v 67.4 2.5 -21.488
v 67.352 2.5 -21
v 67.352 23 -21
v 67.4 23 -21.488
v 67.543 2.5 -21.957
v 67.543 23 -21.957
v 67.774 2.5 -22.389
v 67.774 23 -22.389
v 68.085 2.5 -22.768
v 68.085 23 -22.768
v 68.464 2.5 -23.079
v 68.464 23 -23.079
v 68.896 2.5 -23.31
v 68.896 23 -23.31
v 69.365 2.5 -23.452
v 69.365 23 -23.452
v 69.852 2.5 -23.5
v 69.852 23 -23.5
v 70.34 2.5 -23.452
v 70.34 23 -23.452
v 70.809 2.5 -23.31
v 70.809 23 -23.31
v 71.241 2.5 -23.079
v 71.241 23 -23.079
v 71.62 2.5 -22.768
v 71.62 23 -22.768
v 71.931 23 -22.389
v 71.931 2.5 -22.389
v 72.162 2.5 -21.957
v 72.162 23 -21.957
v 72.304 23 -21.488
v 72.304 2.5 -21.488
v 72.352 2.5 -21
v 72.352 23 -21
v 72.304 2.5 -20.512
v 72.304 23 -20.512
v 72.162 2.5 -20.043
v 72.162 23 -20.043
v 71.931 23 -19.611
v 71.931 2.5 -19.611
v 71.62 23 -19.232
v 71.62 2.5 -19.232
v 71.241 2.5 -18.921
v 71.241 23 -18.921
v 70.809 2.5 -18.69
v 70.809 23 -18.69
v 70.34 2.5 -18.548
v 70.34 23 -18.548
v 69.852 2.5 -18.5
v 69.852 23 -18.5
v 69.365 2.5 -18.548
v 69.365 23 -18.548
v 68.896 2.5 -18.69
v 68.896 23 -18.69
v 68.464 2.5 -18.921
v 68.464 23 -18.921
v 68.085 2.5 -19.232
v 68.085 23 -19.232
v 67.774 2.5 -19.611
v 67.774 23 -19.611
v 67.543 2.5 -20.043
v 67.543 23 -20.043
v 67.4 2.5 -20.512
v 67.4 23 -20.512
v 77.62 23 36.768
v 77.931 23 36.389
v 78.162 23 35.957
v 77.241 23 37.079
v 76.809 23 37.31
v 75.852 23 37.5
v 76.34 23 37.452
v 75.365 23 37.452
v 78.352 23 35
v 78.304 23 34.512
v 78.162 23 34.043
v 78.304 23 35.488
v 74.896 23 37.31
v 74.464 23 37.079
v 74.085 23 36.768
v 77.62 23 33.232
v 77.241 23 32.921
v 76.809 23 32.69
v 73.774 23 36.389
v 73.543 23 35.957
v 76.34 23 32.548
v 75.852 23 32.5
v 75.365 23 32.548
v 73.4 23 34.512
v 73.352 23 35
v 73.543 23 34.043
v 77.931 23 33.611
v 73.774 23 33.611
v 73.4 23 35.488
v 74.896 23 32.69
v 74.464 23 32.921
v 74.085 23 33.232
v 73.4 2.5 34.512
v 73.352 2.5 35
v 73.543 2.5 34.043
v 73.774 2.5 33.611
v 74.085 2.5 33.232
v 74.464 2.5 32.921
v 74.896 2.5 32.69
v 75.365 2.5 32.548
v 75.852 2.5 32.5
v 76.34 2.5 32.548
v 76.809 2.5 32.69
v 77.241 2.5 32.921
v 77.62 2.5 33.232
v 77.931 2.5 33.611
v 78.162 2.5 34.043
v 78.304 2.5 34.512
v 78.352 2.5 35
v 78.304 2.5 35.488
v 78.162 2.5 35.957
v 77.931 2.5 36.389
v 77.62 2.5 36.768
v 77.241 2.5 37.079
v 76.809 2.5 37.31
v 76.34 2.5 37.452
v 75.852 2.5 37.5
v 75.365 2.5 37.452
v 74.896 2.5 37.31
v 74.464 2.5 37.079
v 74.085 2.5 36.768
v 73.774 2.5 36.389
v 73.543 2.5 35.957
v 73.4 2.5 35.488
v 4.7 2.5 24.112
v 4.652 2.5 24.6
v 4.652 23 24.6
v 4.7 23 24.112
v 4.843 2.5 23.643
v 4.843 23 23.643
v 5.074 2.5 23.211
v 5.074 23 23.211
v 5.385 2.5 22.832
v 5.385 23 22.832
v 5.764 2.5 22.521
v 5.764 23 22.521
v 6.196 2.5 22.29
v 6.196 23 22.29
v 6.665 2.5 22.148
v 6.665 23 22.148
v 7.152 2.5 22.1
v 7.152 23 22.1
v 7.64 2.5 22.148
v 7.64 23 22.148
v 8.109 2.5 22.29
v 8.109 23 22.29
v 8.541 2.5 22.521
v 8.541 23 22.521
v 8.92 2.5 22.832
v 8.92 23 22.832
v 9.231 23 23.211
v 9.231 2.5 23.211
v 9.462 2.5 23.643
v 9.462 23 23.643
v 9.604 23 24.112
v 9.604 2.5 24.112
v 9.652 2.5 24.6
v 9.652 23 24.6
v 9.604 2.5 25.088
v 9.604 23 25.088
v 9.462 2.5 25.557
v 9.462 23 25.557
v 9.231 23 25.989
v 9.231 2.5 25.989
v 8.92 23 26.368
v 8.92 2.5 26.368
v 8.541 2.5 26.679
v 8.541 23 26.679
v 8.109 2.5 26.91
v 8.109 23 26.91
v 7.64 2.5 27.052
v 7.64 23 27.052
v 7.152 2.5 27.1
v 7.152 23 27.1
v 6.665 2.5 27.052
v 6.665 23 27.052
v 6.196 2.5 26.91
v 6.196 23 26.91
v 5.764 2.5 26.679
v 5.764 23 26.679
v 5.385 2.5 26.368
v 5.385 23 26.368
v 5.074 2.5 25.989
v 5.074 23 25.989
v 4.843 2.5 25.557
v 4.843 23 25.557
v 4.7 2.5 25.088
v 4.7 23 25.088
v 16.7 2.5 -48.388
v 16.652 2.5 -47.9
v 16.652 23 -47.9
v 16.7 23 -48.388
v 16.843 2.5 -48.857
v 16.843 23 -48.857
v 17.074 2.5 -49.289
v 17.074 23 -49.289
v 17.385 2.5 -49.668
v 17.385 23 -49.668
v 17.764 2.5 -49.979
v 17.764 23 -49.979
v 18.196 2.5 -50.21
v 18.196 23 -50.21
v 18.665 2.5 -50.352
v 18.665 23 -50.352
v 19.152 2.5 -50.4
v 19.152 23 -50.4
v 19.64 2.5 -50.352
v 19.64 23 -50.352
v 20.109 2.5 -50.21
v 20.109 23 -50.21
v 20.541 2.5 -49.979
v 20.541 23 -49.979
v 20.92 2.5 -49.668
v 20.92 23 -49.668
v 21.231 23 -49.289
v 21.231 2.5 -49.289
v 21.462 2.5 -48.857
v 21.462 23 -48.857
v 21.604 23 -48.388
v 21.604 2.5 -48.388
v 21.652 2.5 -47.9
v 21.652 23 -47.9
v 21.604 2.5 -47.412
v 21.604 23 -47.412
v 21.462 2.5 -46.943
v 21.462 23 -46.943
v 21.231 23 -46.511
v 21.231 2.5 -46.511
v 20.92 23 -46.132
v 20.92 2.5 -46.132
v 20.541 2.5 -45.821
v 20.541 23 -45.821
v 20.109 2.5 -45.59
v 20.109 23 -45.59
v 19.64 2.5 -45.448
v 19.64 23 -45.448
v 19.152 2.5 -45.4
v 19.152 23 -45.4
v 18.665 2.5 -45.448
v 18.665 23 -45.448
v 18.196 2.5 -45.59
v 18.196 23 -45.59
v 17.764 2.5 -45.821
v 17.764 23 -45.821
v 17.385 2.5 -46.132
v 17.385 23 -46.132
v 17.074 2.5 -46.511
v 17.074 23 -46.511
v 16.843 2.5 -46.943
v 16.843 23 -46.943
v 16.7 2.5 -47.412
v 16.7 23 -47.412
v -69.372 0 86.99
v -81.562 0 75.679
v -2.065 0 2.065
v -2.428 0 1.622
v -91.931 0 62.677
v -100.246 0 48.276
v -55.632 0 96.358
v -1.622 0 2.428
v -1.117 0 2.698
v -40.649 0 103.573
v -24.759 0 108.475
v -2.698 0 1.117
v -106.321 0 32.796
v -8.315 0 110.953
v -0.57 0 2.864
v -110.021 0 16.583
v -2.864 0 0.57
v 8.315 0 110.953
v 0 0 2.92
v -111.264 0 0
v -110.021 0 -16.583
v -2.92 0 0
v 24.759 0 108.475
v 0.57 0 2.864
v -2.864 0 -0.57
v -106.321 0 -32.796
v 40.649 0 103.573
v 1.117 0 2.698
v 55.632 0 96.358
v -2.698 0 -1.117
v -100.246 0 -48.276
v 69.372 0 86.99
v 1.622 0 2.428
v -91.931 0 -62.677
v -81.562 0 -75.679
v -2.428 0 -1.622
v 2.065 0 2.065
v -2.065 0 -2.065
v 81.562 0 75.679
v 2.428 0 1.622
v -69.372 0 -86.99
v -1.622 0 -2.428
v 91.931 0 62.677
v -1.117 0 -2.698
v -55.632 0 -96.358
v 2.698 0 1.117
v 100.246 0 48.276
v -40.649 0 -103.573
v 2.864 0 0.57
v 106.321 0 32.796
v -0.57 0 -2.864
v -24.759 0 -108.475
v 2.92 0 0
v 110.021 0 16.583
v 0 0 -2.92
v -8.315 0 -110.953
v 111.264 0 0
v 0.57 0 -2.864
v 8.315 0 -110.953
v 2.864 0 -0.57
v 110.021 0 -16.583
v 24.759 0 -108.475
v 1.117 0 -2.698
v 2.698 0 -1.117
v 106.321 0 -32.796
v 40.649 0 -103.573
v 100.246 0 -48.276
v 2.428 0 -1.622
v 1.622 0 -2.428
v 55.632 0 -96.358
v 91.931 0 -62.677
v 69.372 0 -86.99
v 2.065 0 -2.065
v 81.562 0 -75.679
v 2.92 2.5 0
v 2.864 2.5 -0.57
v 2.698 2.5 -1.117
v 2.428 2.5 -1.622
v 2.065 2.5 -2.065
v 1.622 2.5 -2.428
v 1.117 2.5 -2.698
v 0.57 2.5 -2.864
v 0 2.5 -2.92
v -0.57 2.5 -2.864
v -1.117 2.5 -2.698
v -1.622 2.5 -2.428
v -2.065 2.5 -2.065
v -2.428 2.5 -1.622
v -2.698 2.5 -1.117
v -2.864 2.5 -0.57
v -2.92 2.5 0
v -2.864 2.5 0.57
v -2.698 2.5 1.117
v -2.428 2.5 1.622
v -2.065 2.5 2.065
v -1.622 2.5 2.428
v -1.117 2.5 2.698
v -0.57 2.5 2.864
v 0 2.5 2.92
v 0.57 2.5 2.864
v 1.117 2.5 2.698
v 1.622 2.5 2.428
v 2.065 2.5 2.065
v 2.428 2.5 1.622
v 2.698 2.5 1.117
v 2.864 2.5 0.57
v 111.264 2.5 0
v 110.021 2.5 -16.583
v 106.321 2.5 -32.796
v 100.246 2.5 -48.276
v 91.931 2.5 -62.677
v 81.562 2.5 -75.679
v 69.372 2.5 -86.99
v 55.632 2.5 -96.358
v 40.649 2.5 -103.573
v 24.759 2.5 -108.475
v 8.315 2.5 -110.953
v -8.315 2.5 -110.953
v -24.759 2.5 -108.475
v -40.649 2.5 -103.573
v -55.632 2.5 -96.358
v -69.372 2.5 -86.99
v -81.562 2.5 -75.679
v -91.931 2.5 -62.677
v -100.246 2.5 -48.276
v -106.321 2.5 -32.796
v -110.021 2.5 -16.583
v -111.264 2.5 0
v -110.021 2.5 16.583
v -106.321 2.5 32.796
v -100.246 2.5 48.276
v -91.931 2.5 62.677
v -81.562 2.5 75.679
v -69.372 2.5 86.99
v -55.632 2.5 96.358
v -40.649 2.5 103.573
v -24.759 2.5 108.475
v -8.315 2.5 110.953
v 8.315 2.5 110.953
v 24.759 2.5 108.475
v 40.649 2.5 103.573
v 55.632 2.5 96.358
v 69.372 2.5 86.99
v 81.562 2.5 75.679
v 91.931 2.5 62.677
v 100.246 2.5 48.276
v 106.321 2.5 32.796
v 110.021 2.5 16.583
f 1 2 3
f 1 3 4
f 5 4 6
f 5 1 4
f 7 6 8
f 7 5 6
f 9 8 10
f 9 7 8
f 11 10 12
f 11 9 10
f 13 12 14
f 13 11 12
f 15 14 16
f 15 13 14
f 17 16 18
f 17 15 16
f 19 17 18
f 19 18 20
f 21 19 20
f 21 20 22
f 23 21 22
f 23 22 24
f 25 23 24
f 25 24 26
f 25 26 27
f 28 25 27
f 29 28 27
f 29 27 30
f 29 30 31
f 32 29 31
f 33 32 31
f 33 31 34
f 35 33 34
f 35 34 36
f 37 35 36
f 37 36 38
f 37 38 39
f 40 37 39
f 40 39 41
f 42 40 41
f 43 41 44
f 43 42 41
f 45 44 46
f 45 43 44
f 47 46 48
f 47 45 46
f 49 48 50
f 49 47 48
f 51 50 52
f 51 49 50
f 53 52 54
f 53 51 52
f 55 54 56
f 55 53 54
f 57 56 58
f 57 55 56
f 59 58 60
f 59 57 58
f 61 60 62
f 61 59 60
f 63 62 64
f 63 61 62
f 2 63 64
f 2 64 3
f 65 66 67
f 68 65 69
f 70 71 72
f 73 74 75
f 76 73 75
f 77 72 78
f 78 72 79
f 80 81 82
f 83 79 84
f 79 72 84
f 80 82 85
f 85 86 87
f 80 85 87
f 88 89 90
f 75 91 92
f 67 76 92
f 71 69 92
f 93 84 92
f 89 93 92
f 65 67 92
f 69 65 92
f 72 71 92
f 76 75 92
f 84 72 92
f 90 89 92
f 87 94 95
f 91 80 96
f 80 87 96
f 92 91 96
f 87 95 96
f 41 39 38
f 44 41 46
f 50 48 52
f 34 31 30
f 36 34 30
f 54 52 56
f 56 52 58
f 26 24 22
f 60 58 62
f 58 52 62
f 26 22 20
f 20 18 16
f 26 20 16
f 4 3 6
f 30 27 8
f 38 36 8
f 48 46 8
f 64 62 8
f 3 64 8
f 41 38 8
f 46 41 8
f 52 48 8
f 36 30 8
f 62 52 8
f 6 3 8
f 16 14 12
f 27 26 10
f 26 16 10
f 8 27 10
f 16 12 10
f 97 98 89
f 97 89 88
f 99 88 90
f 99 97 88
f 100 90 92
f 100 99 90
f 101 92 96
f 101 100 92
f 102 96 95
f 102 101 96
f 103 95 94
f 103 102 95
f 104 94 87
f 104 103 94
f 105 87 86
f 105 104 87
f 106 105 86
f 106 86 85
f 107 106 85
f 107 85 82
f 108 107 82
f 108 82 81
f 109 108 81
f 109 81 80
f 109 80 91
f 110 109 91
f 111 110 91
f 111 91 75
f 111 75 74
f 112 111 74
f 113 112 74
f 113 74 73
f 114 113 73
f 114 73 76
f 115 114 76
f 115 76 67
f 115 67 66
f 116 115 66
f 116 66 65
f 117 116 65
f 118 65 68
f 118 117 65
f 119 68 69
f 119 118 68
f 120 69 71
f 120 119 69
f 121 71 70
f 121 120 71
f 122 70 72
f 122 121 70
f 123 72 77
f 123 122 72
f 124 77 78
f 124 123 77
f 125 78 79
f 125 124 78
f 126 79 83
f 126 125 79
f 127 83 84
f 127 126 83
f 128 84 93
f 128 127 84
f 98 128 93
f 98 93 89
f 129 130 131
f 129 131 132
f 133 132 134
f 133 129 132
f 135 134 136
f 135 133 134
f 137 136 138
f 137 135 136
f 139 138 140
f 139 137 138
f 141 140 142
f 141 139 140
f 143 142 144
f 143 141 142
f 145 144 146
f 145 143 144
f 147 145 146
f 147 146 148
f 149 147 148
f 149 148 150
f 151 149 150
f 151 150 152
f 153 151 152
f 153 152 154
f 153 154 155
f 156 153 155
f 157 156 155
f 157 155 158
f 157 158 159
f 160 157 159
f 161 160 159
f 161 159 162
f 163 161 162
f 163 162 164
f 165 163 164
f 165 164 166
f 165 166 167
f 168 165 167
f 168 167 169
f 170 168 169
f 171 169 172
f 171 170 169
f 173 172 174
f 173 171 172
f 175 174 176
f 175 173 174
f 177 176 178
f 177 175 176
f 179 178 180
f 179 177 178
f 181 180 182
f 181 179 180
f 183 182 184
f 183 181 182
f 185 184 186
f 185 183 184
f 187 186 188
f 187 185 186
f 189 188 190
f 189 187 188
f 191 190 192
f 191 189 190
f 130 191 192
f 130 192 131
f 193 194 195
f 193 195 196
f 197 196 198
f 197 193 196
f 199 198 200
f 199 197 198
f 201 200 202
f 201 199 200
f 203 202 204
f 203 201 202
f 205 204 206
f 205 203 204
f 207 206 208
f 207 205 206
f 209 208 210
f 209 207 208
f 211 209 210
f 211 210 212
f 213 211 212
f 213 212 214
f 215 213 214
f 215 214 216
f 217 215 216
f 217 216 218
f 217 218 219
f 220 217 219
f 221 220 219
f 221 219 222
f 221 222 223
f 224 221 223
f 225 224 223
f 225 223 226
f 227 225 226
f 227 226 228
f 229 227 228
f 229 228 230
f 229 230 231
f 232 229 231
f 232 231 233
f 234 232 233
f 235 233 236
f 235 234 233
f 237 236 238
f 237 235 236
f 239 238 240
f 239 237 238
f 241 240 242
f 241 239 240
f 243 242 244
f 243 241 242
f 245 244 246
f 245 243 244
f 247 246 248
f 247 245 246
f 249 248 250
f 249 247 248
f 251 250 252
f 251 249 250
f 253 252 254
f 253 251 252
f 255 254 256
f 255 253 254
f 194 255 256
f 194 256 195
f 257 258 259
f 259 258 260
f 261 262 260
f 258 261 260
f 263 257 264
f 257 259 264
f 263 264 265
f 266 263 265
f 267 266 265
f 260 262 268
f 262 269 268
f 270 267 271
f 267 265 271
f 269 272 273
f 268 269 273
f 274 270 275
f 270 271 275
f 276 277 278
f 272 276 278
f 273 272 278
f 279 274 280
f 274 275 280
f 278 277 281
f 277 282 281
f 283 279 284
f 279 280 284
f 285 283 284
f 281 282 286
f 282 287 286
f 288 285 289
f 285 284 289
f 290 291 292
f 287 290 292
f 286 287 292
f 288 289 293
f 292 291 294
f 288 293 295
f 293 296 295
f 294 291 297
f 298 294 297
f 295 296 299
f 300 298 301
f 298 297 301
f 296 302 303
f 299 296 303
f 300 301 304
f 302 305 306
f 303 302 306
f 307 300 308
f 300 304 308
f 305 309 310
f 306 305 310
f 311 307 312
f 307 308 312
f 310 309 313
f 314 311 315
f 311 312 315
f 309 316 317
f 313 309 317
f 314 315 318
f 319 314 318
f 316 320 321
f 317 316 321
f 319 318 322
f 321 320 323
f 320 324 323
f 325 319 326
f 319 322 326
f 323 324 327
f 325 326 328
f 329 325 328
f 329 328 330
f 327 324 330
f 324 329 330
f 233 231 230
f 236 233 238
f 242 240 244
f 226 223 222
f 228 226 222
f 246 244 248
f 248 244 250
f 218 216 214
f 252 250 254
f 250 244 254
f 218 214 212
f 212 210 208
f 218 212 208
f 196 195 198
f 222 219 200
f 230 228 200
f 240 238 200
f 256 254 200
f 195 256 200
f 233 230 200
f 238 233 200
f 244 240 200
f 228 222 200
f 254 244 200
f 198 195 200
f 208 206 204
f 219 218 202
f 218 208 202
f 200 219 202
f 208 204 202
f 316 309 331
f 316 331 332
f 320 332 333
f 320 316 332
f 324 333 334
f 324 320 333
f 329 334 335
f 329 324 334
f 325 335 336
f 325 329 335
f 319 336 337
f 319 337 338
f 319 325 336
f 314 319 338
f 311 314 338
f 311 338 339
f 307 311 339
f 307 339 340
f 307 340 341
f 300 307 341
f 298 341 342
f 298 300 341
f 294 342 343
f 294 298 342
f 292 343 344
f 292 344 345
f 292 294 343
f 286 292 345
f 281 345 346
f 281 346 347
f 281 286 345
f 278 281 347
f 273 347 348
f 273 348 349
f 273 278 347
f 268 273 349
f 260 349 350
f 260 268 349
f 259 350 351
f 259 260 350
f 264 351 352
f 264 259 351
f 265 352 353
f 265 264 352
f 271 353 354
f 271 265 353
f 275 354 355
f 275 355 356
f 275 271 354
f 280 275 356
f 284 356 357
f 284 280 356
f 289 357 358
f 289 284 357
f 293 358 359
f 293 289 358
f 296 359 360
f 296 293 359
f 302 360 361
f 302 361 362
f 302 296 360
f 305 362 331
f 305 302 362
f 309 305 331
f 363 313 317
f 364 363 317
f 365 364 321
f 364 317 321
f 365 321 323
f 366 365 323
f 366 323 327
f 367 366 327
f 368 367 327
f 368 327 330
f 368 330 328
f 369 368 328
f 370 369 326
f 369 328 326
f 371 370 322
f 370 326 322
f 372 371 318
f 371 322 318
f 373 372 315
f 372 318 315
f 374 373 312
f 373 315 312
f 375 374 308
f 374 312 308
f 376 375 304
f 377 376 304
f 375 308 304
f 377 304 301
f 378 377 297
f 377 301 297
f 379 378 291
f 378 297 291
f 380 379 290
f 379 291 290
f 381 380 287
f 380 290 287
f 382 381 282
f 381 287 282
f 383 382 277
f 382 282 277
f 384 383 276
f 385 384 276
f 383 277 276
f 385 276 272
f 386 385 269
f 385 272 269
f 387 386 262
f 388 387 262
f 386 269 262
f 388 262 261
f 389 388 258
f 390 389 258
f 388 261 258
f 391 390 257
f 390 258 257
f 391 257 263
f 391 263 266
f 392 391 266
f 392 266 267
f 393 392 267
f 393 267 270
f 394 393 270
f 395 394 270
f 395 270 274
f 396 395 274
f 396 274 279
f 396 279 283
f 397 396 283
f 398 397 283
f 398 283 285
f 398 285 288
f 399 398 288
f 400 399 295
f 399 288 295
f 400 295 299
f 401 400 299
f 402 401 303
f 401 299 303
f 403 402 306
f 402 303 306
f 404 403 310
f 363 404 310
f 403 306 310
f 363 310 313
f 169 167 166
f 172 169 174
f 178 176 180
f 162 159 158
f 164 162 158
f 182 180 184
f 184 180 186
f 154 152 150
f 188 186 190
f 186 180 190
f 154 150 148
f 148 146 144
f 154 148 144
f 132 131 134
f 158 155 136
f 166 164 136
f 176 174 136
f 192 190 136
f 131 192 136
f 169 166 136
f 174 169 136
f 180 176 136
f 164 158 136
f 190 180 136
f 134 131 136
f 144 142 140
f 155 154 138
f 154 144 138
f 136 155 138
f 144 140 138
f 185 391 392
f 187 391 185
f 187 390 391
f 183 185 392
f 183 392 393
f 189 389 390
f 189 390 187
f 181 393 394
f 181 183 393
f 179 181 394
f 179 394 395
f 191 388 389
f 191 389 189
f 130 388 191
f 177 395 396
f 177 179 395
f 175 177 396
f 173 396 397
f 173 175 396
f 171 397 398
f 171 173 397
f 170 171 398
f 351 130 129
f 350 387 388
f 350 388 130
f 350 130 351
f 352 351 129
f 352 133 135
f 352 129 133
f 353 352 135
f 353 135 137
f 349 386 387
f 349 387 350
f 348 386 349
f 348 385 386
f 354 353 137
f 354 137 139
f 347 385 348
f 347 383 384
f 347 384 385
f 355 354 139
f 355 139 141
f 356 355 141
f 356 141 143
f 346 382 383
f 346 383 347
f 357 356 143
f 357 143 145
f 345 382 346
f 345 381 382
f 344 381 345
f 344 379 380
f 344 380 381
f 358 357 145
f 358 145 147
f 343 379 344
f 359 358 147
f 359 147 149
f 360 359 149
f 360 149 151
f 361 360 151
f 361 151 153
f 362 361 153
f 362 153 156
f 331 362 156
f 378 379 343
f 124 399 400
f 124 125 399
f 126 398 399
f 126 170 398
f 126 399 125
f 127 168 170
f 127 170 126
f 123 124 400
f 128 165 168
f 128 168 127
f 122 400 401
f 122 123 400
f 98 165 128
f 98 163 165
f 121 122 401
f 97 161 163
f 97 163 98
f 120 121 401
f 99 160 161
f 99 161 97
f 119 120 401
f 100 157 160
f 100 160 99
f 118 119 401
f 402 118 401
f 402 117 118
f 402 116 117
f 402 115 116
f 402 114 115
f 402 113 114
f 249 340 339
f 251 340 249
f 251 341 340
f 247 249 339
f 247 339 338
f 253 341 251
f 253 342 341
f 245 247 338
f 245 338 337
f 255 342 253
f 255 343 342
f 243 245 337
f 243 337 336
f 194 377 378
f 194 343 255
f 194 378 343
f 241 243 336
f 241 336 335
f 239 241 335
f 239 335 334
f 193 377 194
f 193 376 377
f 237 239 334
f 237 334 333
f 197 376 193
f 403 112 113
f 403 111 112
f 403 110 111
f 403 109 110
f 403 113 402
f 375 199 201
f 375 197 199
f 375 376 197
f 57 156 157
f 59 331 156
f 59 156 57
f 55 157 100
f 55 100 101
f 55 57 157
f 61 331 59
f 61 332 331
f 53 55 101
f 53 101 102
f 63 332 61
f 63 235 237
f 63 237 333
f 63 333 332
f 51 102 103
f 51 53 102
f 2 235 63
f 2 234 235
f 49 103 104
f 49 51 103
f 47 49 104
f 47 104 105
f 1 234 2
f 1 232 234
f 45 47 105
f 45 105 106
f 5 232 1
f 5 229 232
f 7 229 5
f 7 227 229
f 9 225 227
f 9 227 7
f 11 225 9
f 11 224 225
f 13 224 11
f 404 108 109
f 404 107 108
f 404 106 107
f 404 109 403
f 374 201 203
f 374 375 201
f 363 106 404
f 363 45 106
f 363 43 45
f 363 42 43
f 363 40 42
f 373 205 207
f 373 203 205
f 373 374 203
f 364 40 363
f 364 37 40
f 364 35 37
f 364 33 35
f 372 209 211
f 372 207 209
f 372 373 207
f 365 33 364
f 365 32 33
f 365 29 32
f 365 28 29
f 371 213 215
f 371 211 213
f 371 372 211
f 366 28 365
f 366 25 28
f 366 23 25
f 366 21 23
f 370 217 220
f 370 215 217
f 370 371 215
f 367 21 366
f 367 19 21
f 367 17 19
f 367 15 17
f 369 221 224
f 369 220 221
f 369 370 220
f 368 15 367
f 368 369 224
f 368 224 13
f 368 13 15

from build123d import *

# Parameters (mm, degrees)
SKETCH1_R            = 111.264222233
SKETCH1_R_2          = 2.92
SKETCH1_R_3          = 2.5
BOSS_EXTRUDE12_DEPTH = 2.5
SKETCH5_R            = 2.5
BOSS_EXTRUDE15_DEPTH = 23
SKETCH6_R            = 2.5
BOSS_EXTRUDE16_DEPTH = 23
SKETCH7_R            = 2.5
BOSS_EXTRUDE17_DEPTH = 23
SKETCH3_R            = 2.5
BOSS_EXTRUDE18_DEPTH = 23


with BuildPart() as part:
    # Sketch1 → Boss-Extrude12 (new body)
    with BuildSketch(Plane(origin=(0, 0, 0), x_dir=(1, 0, 0), z_dir=(0, 1, 0))):
        Circle(SKETCH1_R)
        Circle(SKETCH1_R_2, mode=Mode.SUBTRACT)
        with Locations((75.852459016, -35)):
            Circle(SKETCH1_R_3, mode=Mode.SUBTRACT)
        with Locations((69.852459016, 21)):
            Circle(SKETCH1_R_3, mode=Mode.SUBTRACT)
        with Locations((19.152459016, 47.9)):
            Circle(SKETCH1_R_3, mode=Mode.SUBTRACT)
        with Locations((7.152459016, -24.6)):
            Circle(SKETCH1_R_3, mode=Mode.SUBTRACT)
    extrude(amount=BOSS_EXTRUDE12_DEPTH)

    # Sketch5 → Boss-Extrude15 (add)
    with BuildSketch(Plane(origin=(0, 0, 0), x_dir=(-1, 0, 0), z_dir=(0, -1, 0))):
        with Locations((-19.152459016, 47.9)):
            Circle(SKETCH5_R)
    extrude(amount=-BOSS_EXTRUDE15_DEPTH)

    # Sketch6 → Boss-Extrude16 (add)
    with BuildSketch(Plane(origin=(0, 0, 0), x_dir=(-1, 0, 0), z_dir=(0, -1, 0))):
        with Locations((-69.852459016, 21)):
            Circle(SKETCH6_R)
    extrude(amount=-BOSS_EXTRUDE16_DEPTH)

    # Sketch7 → Boss-Extrude17 (add)
    with BuildSketch(Plane(origin=(0, 0, 0), x_dir=(-1, 0, 0), z_dir=(0, -1, 0))):
        with Locations((-75.852459016, -35)):
            Circle(SKETCH7_R)
    extrude(amount=-BOSS_EXTRUDE17_DEPTH)

    # Sketch3 → Boss-Extrude18 (add)
    with BuildSketch(Plane(origin=(0, 0, 0), x_dir=(-1, 0, 0), z_dir=(0, -1, 0))):
        with Locations((-7.152459016, -24.6)):
            Circle(SKETCH3_R)
    extrude(amount=-BOSS_EXTRUDE18_DEPTH)


solid = part.part
